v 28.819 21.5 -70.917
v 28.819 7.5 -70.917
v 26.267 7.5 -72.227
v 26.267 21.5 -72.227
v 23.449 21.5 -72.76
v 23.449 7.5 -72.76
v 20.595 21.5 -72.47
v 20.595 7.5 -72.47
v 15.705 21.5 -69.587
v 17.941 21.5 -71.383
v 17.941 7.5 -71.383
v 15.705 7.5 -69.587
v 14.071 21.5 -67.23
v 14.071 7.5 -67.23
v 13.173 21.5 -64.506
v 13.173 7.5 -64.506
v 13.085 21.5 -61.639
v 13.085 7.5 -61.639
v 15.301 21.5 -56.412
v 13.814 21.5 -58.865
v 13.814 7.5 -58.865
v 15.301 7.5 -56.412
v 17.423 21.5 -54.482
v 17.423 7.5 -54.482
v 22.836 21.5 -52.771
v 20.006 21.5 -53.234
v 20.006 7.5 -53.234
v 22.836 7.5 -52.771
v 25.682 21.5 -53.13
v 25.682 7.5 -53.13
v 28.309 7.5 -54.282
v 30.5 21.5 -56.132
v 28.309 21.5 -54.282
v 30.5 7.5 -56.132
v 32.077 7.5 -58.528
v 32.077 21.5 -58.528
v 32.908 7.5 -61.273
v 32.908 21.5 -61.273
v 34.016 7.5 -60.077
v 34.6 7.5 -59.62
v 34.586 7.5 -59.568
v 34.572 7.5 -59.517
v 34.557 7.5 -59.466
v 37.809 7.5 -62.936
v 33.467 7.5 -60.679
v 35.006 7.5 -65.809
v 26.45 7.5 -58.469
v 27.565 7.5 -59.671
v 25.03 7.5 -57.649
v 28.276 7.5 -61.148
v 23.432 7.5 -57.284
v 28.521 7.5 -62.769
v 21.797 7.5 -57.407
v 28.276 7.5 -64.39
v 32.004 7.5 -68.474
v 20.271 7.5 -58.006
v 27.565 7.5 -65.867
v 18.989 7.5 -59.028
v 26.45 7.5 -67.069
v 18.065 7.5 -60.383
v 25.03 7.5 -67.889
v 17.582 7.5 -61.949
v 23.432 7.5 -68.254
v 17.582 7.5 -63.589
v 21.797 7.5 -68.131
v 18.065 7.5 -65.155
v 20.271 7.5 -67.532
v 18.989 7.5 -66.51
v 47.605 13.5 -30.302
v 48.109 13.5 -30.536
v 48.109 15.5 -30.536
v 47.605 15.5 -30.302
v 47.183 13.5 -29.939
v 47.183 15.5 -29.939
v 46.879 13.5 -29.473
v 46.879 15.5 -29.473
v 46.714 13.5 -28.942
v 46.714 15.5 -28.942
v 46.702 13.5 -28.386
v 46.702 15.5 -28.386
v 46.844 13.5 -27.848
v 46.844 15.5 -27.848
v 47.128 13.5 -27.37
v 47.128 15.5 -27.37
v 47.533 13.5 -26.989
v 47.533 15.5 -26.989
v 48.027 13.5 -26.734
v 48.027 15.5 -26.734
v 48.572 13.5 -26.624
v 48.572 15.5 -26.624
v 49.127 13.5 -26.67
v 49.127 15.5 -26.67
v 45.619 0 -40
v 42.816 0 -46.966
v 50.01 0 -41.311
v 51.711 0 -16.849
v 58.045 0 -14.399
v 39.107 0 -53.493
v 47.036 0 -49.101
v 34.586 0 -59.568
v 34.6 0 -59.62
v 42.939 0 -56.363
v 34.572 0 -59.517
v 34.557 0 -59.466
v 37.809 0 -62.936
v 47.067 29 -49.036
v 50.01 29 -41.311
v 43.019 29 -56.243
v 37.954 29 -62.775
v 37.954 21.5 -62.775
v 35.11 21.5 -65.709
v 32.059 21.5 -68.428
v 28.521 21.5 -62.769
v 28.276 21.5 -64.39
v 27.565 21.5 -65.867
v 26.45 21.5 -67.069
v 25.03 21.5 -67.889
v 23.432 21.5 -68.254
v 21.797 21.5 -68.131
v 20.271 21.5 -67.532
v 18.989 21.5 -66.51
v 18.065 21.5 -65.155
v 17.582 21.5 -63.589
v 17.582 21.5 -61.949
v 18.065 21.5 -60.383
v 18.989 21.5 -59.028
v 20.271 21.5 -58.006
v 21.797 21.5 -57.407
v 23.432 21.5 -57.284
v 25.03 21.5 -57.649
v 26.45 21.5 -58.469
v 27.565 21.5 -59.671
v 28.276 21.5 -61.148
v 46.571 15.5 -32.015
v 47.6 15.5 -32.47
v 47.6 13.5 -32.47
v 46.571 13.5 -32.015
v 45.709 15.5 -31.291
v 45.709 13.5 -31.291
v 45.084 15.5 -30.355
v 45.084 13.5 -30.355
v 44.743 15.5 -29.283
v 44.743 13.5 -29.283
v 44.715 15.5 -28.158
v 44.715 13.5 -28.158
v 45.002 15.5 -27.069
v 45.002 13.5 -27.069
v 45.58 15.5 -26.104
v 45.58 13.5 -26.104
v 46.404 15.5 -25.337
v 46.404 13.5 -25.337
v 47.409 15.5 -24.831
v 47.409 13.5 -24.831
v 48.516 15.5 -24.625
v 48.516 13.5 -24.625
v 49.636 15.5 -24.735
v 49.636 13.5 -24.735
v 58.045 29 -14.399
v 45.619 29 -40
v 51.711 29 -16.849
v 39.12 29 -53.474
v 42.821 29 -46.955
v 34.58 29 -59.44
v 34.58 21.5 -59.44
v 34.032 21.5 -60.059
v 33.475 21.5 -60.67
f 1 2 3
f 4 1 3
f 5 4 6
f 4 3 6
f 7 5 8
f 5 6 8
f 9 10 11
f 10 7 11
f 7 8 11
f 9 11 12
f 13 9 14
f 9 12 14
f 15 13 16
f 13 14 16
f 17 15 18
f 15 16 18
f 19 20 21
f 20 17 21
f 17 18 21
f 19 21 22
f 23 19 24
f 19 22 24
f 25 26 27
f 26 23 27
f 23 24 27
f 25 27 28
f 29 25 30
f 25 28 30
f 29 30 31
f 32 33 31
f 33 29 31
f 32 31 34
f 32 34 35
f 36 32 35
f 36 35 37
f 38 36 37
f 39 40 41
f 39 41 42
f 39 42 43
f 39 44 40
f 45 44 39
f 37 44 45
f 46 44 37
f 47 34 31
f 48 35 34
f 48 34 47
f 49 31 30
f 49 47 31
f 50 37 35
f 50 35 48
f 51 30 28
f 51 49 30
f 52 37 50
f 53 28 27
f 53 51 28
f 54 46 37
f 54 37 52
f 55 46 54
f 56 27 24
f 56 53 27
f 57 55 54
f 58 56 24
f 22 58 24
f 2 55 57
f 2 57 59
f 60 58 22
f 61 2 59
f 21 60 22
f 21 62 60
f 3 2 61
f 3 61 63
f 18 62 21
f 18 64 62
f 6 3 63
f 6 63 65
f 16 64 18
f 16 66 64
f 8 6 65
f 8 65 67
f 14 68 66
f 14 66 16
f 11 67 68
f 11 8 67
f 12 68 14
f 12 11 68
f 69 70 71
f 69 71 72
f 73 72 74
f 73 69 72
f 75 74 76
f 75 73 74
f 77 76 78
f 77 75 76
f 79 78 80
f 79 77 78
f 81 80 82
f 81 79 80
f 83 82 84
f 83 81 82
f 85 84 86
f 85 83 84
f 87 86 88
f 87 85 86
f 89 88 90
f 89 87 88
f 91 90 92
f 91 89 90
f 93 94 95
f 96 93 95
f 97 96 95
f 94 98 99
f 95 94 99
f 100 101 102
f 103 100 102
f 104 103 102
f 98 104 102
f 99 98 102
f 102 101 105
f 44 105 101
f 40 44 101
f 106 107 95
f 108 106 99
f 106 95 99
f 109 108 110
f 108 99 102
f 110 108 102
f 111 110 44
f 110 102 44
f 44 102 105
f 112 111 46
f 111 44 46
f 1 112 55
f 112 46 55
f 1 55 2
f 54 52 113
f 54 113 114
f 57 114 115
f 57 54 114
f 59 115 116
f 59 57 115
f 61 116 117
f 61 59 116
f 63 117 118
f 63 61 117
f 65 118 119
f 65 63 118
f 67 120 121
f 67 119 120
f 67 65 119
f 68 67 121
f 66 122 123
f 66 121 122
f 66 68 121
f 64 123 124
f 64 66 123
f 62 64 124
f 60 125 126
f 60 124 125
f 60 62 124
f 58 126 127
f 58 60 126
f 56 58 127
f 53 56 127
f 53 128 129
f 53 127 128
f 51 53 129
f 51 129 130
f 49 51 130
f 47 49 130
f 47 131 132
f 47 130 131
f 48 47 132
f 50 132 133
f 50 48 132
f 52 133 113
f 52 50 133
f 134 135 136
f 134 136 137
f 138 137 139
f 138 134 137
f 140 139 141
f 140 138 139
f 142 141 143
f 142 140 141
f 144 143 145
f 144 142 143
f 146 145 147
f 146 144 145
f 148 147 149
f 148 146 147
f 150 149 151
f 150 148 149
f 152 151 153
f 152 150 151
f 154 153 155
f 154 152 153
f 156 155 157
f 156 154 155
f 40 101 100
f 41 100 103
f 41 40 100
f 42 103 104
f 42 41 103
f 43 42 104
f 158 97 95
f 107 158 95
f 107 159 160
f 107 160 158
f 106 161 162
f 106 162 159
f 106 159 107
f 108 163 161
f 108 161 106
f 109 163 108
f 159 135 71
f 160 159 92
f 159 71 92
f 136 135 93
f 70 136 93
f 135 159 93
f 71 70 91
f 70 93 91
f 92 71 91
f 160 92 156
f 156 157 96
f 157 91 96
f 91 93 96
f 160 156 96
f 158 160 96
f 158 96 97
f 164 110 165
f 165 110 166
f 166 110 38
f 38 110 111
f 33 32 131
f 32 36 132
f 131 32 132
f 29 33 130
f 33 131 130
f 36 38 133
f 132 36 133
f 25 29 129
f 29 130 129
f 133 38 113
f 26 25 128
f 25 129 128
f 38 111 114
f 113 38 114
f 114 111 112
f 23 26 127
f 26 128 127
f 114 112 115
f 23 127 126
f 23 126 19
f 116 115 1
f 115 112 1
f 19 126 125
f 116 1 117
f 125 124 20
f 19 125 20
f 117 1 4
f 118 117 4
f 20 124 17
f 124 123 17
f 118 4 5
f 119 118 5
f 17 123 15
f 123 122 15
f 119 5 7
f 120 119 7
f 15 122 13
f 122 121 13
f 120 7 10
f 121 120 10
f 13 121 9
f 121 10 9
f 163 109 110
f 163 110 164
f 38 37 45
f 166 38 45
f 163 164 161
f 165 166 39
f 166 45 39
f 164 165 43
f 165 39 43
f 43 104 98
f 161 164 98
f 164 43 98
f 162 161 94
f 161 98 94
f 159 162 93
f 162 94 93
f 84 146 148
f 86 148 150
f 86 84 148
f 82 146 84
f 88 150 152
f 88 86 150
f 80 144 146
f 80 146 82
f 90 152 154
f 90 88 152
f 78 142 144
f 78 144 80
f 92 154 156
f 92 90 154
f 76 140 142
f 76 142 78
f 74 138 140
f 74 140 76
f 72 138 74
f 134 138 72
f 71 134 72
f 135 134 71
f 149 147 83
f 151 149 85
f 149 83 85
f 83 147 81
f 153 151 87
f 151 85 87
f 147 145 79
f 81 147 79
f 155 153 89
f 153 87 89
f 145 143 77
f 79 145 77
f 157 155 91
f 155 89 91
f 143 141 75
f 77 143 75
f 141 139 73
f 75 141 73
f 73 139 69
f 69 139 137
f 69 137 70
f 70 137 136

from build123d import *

# Parameters (mm, degrees)
SKETCH2_R                = 5.5
BOSS_EXTRUDE1_DEPTH      = 29
SKETCH3_R                = 12
CUT_EXTRUDE5_DEPTH       = 7
CUT_EXTRUDE5_DEPTH_BACK  = 0.5
SKETCH6_R                = 12
CUT_EXTRUDE6_DEPTH       = 7
CUT_EXTRUDE6_DEPTH_BACK  = 0.5
SKETCH9_R                = 4
SKETCH9_R_2              = 2
BOSS_EXTRUDE2_DEPTH      = 1
BOSS_EXTRUDE2_DEPTH_BACK = 1


with BuildPart() as part:
    # Sketch2 → Boss-Extrude1 (new body)
    with BuildSketch(Plane(origin=(0, 0, 0), x_dir=(1, 0, 0), z_dir=(0, 1, 0))):
        with BuildLine():
            ThreePointArc((50.009794046, 41.311227393), (41.887297641, 57.884223181), (28.818508763, 70.916716976))
            ThreePointArc((28.818508763, 70.916716976), (13.814285335, 58.864855467), (32.908133208, 61.2729792))
            ThreePointArc((32.908133208, 61.2729792), (40.45496434, 51.34849017), (45.618872448, 40.00017771))
            Line((45.618872448, 40.00017771), (51.710808427, 16.848599978))
            Line((51.710808427, 16.848599978), (58.045348615, 14.398829975))
            Line((58.045348615, 14.398829975), (50.009794046, 41.311227393))
        make_face()
        with Locations((23.020672213, 62.769012309)):
            Circle(SKETCH2_R, mode=Mode.SUBTRACT)
    extrude(amount=BOSS_EXTRUDE1_DEPTH)

    # Sketch3 → Cut-Extrude5 (cut, two sides)
    with BuildSketch(Plane(origin=(0, 7, 0), x_dir=(-1, 0, 0), z_dir=(0, -1, 0))) as cut_extrude5_sk:
        Polygon((-39.457331724, 64.63900974), (-16.53662743, 40.953334568), (-1.019451578, 59.252301049), (-23.940155872, 82.937976221), align=None)
        with Locations((-23.020672213, 62.769012309)):
            Circle(SKETCH3_R, mode=Mode.SUBTRACT)
        with BuildLine():
            ThreePointArc((-11.020672213, 62.769012309), (-24.609375035, 74.663381706), (-34.600009437, 59.619575938))
            Line((-34.600009437, 59.619575938), (-26.548423191, 51.29927068))
            ThreePointArc((-26.548423191, 51.29927068), (-15.890911057, 53.116732482), (-11.020672213, 62.769012309))
        make_face()
        with BuildLine():
            Line((-26.548423191, 51.29927068), (-34.600009437, 59.619575938))
            ThreePointArc((-34.600009437, 59.619575938), (-31.644064723, 54.424127551), (-26.548423191, 51.29927068))
        make_face()
    extrude(amount=CUT_EXTRUDE5_DEPTH, mode=Mode.SUBTRACT)
    extrude(cut_extrude5_sk.sketch, amount=-CUT_EXTRUDE5_DEPTH_BACK, mode=Mode.SUBTRACT)

    # Sketch6 → Cut-Extrude6 (cut, two sides)
    with BuildSketch(Plane(origin=(0, 22, 0), x_dir=(1, 0, 0), z_dir=(0, 1, 0))) as cut_extrude6_sk:
        Polygon((38.61882347, 63.432982973), (15.193844621, 40.271001155), (3.602276136, 63.900303012), (27.027254985, 87.06228483), align=None)
        with Locations((23.020672213, 62.769012309)):
            Circle(SKETCH6_R, mode=Mode.SUBTRACT)
        with BuildLine():
            ThreePointArc((26.262238297, 51.21512771), (31.457917246, 54.235965008), (34.537222393, 59.397206866))
            Line((34.537222393, 59.397206866), (26.262238297, 51.21512771))
        make_face()
        with BuildLine():
            Line((26.262238297, 51.21512771), (34.537222393, 59.397206866))
            ThreePointArc((34.537222393, 59.397206866), (34.899194894, 61.065868475), (35.020672213, 62.769012309))
            ThreePointArc((35.020672213, 62.769012309), (13.457754431, 70.018191814), (26.262238297, 51.21512771))
        make_face()
    extrude(amount=CUT_EXTRUDE6_DEPTH, mode=Mode.SUBTRACT)
    extrude(cut_extrude6_sk.sketch, amount=-CUT_EXTRUDE6_DEPTH_BACK, mode=Mode.SUBTRACT)

    # Sketch9 → Boss-Extrude2 (add, two sides)
    with BuildSketch(Plane(origin=(0, 14.5, 0), x_dir=(1, 0, 0), z_dir=(0, 1, 0))) as boss_extrude2_sk:
        with Locations((48.688174425, 28.621117181)):
            Circle(SKETCH9_R)
        with Locations((48.688174425, 28.621117181)):
            Circle(SKETCH9_R_2, mode=Mode.SUBTRACT)
    extrude(amount=BOSS_EXTRUDE2_DEPTH)
    extrude(boss_extrude2_sk.sketch, amount=-BOSS_EXTRUDE2_DEPTH_BACK)


solid = part.part
